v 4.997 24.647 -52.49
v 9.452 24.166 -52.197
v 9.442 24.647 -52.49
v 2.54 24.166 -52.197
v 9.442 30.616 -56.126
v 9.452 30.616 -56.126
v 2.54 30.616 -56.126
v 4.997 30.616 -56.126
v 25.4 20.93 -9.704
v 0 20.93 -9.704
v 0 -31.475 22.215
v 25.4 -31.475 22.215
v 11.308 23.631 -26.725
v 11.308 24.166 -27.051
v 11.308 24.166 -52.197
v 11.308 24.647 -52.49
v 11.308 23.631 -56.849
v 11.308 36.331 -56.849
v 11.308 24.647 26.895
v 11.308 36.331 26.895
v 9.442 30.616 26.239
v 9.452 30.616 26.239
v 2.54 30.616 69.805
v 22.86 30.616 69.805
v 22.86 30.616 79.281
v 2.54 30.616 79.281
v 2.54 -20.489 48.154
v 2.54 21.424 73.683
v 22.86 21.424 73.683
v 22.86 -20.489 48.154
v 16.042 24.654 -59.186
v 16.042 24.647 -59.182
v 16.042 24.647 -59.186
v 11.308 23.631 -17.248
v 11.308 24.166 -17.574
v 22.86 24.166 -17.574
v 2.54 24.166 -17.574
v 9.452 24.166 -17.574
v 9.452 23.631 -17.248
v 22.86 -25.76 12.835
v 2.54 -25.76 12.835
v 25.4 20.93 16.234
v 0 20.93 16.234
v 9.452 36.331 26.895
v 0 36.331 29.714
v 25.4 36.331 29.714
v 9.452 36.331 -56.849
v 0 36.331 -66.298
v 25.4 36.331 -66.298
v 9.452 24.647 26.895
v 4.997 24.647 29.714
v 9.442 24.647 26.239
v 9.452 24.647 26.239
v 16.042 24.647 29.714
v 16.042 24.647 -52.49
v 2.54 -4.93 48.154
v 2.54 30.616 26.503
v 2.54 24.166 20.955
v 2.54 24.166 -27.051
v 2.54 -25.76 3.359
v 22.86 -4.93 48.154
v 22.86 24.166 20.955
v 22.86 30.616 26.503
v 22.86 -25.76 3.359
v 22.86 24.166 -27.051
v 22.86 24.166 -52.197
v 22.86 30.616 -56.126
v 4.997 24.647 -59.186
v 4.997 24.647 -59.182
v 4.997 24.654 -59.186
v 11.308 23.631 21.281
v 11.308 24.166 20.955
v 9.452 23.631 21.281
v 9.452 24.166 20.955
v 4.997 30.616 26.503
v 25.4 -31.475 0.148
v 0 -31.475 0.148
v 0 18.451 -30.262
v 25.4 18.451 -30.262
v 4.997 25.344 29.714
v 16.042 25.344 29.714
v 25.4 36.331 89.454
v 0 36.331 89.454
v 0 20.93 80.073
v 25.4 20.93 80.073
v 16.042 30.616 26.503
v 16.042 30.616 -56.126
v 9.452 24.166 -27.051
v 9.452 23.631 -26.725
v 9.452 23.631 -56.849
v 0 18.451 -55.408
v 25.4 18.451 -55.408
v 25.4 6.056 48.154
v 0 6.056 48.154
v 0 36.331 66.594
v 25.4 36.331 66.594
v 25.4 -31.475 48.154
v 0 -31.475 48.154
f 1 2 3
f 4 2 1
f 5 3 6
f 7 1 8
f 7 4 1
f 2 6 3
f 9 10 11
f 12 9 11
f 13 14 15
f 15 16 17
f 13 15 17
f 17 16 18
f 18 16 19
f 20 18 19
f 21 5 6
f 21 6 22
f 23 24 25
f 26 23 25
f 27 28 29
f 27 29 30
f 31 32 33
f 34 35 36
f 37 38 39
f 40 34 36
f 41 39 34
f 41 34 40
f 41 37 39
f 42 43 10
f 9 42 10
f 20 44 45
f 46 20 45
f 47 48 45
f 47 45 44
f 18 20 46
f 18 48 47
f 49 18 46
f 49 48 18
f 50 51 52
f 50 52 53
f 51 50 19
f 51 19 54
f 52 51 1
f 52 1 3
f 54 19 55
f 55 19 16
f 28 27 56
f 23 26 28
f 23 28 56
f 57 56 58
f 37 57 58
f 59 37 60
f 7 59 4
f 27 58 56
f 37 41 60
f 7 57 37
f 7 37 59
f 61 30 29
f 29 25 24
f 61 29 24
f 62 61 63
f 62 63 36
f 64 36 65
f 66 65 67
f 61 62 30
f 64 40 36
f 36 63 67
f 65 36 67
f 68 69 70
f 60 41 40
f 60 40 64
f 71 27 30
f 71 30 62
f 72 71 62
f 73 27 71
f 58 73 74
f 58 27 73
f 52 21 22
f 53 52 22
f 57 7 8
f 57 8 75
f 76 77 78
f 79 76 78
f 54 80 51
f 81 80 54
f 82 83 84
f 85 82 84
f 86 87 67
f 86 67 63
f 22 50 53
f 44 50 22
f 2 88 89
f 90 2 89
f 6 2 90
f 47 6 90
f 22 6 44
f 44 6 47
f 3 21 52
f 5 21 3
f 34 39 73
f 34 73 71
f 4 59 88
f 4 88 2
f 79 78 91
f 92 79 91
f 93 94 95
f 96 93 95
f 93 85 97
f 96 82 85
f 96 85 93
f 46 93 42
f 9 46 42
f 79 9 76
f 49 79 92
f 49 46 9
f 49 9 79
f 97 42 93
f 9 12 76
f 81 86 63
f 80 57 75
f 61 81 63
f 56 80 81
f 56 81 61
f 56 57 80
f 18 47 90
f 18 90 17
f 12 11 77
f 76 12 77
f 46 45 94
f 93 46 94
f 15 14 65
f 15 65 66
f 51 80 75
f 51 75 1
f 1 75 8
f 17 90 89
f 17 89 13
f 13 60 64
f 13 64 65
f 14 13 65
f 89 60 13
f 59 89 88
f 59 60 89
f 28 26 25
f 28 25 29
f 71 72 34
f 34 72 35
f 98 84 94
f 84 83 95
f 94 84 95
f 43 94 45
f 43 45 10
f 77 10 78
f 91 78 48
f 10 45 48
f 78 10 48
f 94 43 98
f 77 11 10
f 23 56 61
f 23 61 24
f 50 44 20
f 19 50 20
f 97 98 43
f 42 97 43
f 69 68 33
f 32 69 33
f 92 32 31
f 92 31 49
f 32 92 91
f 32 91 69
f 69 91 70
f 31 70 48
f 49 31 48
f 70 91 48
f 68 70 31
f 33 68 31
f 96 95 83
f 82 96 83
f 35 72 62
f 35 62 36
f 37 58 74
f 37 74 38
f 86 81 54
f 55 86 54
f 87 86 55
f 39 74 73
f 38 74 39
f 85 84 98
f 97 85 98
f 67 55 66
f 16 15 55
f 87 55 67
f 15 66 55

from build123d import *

# Parameters (mm, degrees)
BOSS_EXTRUDE3_DEPTH = 25.4
CUT_EXTRUDE2_START  = 2.54
CUT_EXTRUDE2_DEPTH  = 20.32
SKETCH4_W           = 11.045594529
SKETCH4_H           = 88.9
SKETCH4_W_2         = 1.520449279
SKETCH4_H_2         = 82.973089228
BOSS_EXTRUDE4_DEPTH = 11.684
SKETCH6_W           = 1.855490656
SKETCH6_H           = 83.744478267
CUT_EXTRUDE4_DEPTH  = 12.7


with BuildPart() as part:
    # Sketch1 → Boss-Extrude3 (new body)
    with BuildSketch(Plane(origin=(0, 0, 0), x_dir=(0, 0, -1), z_dir=(1, 0, 0))):
        Polygon((-80.07339815, 20.92975129), (-48.153855616, -31.475467797), (-16.234313081, 20.92975129), (9.704221599, 20.92975129), (-22.215320936, -31.475467797), (-0.147855616, -31.475467797), (30.261707149, 18.450680026), (55.407707149, 18.450680026), (66.298249821, 36.330675457), (-29.713750179, 36.330675457), (-48.153855616, 6.055875486), (-66.593961052, 36.330675457), (-89.453961052, 36.330675457), align=None)
    extrude(amount=BOSS_EXTRUDE3_DEPTH)

    # Sketch1<7> → Cut-Extrude2 (cut)
    with BuildSketch(Plane(origin=(0, 0, 0), x_dir=(0, 0, -1), z_dir=(1, 0, 0)).offset(CUT_EXTRUDE2_START)):
        Polygon((-73.682530671, 21.423584358), (-48.153855616, -20.489165733), (-20.954995017, 24.165680026), (17.574318407, 24.165680026), (-12.835244358, -25.760467797), (-3.358557782, -25.760467797), (27.051004983, 24.165680026), (52.197004983, 24.165680026), (56.125638564, 30.615675457), (-26.503048012, 30.615675457), (-48.153855616, -4.930426578), (-69.804663219, 30.615675457), (-79.281349795, 30.615675457), align=None)
    extrude(amount=CUT_EXTRUDE2_DEPTH, mode=Mode.SUBTRACT)

    # Sketch4 → Boss-Extrude4 (add)
    with BuildSketch(Plane(origin=(0, 36.330675457, 0), x_dir=(1, 0, 0), z_dir=(0, 1, 0))):
        with Locations((10.519546417, 14.736249821)):
            Rectangle(SKETCH4_W, SKETCH4_H)
        with Locations((10.202119042, 15.247213808)):
            Rectangle(SKETCH4_W_2, SKETCH4_H_2, mode=Mode.SUBTRACT)
    extrude(amount=-BOSS_EXTRUDE4_DEPTH)

    # Sketch6 → Cut-Extrude4 (cut)
    with BuildSketch(Plane(origin=(0, 36.330675457, 0), x_dir=(1, 0, 0), z_dir=(0, 1, 0))):
        with Locations((10.379765694, 14.977090577)):
            Rectangle(SKETCH6_W, SKETCH6_H)
    extrude(amount=-CUT_EXTRUDE4_DEPTH, mode=Mode.SUBTRACT)


solid = part.part
